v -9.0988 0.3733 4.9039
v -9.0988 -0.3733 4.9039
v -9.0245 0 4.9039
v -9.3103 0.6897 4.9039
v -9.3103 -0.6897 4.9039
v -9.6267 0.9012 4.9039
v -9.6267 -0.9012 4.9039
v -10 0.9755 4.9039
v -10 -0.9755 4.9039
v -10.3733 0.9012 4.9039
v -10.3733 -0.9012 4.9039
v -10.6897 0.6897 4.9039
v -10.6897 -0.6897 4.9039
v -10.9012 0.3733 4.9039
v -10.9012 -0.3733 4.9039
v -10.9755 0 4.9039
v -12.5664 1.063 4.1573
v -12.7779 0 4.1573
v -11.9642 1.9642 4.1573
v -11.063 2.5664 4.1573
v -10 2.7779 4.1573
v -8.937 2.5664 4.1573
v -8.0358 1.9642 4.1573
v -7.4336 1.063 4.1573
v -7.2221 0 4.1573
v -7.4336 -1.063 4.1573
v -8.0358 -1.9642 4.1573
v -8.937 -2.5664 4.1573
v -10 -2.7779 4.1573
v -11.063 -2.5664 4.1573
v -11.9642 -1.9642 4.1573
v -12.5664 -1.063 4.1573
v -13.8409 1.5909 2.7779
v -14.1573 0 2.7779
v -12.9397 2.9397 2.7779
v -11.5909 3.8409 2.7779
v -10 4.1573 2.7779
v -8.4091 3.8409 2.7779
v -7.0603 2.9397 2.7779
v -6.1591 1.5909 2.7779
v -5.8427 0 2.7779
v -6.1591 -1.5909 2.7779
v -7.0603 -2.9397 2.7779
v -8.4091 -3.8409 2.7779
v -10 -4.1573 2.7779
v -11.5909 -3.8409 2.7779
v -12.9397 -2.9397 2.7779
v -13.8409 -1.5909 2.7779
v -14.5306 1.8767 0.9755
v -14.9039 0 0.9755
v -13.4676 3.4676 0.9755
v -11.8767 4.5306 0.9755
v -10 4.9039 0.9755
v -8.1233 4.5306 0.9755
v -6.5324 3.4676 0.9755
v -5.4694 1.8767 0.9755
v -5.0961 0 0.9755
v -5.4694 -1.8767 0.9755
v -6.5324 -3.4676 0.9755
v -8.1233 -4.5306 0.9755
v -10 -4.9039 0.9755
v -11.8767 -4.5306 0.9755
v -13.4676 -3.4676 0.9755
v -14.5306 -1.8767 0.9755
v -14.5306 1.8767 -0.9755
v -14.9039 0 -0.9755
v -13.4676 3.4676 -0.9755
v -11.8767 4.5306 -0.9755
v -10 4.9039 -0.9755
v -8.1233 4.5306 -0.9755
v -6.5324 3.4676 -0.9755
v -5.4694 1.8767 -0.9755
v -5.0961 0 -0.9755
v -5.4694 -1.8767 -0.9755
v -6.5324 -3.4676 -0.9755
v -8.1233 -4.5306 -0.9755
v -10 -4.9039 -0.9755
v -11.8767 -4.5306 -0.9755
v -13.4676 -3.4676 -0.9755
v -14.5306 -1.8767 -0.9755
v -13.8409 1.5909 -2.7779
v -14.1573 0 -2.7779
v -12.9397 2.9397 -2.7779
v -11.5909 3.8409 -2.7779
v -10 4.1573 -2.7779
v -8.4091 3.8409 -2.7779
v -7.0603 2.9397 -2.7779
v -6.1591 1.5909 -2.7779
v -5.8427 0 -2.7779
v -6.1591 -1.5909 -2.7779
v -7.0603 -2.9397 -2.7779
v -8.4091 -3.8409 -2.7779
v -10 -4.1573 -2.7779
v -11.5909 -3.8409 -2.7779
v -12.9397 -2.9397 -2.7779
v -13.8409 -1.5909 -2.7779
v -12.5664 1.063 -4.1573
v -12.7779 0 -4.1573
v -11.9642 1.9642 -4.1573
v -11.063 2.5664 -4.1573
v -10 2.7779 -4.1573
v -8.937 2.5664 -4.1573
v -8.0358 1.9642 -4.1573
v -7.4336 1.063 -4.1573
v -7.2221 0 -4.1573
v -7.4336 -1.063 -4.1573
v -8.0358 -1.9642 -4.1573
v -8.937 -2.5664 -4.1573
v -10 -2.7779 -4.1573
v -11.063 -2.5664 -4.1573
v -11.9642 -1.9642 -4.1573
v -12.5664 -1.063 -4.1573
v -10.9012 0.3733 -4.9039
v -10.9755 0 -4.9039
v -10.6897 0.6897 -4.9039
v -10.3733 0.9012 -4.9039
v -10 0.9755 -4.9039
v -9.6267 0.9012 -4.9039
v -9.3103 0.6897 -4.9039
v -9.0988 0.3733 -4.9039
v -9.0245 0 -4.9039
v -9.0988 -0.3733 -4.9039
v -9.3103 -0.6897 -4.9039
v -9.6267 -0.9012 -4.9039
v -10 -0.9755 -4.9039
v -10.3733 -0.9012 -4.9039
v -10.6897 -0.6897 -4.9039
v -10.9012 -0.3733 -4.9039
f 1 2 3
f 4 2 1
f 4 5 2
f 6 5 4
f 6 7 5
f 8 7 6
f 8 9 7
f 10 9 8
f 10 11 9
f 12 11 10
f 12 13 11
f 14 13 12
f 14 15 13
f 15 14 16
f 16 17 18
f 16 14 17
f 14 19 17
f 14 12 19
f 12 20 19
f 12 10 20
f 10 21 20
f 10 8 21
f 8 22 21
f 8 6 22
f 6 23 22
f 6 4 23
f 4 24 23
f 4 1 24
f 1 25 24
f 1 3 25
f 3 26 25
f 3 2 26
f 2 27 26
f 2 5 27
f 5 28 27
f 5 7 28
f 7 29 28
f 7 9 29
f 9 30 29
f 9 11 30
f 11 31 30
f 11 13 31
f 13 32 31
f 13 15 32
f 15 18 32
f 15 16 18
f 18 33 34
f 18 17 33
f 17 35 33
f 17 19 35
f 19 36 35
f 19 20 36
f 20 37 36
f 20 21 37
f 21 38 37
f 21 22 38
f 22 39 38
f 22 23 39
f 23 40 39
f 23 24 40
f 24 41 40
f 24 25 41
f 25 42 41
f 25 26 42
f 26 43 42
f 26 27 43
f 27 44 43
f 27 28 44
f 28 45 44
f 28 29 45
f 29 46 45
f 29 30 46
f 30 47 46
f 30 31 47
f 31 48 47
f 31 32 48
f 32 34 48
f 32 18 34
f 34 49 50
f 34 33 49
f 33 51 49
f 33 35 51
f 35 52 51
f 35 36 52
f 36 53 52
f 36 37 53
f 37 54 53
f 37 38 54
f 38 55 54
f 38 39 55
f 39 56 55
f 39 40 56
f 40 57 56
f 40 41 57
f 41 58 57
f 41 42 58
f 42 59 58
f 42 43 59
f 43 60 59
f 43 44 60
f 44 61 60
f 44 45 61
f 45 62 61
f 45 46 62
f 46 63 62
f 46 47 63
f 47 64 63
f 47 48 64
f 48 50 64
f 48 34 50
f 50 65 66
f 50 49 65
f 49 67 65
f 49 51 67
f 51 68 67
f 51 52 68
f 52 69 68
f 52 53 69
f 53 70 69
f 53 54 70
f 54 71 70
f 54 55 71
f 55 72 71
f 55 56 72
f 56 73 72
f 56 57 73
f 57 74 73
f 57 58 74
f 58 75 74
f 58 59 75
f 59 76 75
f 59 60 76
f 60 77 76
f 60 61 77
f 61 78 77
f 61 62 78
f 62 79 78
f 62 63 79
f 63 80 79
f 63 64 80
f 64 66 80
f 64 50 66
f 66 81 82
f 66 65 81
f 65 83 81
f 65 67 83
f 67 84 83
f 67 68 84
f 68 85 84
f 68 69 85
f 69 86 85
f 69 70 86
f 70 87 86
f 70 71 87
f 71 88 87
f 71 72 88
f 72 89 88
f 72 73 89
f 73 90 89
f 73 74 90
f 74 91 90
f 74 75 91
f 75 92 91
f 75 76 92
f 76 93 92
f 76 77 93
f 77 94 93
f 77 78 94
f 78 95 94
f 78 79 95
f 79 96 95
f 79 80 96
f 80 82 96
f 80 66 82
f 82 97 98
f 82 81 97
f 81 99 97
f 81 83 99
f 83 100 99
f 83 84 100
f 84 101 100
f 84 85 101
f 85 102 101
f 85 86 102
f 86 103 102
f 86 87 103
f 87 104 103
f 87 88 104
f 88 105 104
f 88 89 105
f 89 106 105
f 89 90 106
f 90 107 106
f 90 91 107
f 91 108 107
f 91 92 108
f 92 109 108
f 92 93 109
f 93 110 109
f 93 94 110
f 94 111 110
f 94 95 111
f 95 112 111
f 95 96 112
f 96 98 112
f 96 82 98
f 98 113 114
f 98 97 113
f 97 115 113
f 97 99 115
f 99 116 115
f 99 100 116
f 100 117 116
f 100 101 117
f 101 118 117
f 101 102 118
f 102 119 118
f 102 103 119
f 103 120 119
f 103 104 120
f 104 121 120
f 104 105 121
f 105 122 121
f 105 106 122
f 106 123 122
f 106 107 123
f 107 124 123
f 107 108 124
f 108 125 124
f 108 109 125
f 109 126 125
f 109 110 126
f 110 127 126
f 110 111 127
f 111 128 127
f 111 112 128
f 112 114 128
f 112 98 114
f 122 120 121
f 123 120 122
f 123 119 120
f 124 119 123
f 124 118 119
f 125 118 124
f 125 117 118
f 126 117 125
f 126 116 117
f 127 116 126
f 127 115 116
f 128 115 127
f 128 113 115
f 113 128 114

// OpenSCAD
// model22: mirror transform
mirror([1, 0, 0]) {
    translate([10, 0, 0]) {
        sphere(r = 5);
    }
}
